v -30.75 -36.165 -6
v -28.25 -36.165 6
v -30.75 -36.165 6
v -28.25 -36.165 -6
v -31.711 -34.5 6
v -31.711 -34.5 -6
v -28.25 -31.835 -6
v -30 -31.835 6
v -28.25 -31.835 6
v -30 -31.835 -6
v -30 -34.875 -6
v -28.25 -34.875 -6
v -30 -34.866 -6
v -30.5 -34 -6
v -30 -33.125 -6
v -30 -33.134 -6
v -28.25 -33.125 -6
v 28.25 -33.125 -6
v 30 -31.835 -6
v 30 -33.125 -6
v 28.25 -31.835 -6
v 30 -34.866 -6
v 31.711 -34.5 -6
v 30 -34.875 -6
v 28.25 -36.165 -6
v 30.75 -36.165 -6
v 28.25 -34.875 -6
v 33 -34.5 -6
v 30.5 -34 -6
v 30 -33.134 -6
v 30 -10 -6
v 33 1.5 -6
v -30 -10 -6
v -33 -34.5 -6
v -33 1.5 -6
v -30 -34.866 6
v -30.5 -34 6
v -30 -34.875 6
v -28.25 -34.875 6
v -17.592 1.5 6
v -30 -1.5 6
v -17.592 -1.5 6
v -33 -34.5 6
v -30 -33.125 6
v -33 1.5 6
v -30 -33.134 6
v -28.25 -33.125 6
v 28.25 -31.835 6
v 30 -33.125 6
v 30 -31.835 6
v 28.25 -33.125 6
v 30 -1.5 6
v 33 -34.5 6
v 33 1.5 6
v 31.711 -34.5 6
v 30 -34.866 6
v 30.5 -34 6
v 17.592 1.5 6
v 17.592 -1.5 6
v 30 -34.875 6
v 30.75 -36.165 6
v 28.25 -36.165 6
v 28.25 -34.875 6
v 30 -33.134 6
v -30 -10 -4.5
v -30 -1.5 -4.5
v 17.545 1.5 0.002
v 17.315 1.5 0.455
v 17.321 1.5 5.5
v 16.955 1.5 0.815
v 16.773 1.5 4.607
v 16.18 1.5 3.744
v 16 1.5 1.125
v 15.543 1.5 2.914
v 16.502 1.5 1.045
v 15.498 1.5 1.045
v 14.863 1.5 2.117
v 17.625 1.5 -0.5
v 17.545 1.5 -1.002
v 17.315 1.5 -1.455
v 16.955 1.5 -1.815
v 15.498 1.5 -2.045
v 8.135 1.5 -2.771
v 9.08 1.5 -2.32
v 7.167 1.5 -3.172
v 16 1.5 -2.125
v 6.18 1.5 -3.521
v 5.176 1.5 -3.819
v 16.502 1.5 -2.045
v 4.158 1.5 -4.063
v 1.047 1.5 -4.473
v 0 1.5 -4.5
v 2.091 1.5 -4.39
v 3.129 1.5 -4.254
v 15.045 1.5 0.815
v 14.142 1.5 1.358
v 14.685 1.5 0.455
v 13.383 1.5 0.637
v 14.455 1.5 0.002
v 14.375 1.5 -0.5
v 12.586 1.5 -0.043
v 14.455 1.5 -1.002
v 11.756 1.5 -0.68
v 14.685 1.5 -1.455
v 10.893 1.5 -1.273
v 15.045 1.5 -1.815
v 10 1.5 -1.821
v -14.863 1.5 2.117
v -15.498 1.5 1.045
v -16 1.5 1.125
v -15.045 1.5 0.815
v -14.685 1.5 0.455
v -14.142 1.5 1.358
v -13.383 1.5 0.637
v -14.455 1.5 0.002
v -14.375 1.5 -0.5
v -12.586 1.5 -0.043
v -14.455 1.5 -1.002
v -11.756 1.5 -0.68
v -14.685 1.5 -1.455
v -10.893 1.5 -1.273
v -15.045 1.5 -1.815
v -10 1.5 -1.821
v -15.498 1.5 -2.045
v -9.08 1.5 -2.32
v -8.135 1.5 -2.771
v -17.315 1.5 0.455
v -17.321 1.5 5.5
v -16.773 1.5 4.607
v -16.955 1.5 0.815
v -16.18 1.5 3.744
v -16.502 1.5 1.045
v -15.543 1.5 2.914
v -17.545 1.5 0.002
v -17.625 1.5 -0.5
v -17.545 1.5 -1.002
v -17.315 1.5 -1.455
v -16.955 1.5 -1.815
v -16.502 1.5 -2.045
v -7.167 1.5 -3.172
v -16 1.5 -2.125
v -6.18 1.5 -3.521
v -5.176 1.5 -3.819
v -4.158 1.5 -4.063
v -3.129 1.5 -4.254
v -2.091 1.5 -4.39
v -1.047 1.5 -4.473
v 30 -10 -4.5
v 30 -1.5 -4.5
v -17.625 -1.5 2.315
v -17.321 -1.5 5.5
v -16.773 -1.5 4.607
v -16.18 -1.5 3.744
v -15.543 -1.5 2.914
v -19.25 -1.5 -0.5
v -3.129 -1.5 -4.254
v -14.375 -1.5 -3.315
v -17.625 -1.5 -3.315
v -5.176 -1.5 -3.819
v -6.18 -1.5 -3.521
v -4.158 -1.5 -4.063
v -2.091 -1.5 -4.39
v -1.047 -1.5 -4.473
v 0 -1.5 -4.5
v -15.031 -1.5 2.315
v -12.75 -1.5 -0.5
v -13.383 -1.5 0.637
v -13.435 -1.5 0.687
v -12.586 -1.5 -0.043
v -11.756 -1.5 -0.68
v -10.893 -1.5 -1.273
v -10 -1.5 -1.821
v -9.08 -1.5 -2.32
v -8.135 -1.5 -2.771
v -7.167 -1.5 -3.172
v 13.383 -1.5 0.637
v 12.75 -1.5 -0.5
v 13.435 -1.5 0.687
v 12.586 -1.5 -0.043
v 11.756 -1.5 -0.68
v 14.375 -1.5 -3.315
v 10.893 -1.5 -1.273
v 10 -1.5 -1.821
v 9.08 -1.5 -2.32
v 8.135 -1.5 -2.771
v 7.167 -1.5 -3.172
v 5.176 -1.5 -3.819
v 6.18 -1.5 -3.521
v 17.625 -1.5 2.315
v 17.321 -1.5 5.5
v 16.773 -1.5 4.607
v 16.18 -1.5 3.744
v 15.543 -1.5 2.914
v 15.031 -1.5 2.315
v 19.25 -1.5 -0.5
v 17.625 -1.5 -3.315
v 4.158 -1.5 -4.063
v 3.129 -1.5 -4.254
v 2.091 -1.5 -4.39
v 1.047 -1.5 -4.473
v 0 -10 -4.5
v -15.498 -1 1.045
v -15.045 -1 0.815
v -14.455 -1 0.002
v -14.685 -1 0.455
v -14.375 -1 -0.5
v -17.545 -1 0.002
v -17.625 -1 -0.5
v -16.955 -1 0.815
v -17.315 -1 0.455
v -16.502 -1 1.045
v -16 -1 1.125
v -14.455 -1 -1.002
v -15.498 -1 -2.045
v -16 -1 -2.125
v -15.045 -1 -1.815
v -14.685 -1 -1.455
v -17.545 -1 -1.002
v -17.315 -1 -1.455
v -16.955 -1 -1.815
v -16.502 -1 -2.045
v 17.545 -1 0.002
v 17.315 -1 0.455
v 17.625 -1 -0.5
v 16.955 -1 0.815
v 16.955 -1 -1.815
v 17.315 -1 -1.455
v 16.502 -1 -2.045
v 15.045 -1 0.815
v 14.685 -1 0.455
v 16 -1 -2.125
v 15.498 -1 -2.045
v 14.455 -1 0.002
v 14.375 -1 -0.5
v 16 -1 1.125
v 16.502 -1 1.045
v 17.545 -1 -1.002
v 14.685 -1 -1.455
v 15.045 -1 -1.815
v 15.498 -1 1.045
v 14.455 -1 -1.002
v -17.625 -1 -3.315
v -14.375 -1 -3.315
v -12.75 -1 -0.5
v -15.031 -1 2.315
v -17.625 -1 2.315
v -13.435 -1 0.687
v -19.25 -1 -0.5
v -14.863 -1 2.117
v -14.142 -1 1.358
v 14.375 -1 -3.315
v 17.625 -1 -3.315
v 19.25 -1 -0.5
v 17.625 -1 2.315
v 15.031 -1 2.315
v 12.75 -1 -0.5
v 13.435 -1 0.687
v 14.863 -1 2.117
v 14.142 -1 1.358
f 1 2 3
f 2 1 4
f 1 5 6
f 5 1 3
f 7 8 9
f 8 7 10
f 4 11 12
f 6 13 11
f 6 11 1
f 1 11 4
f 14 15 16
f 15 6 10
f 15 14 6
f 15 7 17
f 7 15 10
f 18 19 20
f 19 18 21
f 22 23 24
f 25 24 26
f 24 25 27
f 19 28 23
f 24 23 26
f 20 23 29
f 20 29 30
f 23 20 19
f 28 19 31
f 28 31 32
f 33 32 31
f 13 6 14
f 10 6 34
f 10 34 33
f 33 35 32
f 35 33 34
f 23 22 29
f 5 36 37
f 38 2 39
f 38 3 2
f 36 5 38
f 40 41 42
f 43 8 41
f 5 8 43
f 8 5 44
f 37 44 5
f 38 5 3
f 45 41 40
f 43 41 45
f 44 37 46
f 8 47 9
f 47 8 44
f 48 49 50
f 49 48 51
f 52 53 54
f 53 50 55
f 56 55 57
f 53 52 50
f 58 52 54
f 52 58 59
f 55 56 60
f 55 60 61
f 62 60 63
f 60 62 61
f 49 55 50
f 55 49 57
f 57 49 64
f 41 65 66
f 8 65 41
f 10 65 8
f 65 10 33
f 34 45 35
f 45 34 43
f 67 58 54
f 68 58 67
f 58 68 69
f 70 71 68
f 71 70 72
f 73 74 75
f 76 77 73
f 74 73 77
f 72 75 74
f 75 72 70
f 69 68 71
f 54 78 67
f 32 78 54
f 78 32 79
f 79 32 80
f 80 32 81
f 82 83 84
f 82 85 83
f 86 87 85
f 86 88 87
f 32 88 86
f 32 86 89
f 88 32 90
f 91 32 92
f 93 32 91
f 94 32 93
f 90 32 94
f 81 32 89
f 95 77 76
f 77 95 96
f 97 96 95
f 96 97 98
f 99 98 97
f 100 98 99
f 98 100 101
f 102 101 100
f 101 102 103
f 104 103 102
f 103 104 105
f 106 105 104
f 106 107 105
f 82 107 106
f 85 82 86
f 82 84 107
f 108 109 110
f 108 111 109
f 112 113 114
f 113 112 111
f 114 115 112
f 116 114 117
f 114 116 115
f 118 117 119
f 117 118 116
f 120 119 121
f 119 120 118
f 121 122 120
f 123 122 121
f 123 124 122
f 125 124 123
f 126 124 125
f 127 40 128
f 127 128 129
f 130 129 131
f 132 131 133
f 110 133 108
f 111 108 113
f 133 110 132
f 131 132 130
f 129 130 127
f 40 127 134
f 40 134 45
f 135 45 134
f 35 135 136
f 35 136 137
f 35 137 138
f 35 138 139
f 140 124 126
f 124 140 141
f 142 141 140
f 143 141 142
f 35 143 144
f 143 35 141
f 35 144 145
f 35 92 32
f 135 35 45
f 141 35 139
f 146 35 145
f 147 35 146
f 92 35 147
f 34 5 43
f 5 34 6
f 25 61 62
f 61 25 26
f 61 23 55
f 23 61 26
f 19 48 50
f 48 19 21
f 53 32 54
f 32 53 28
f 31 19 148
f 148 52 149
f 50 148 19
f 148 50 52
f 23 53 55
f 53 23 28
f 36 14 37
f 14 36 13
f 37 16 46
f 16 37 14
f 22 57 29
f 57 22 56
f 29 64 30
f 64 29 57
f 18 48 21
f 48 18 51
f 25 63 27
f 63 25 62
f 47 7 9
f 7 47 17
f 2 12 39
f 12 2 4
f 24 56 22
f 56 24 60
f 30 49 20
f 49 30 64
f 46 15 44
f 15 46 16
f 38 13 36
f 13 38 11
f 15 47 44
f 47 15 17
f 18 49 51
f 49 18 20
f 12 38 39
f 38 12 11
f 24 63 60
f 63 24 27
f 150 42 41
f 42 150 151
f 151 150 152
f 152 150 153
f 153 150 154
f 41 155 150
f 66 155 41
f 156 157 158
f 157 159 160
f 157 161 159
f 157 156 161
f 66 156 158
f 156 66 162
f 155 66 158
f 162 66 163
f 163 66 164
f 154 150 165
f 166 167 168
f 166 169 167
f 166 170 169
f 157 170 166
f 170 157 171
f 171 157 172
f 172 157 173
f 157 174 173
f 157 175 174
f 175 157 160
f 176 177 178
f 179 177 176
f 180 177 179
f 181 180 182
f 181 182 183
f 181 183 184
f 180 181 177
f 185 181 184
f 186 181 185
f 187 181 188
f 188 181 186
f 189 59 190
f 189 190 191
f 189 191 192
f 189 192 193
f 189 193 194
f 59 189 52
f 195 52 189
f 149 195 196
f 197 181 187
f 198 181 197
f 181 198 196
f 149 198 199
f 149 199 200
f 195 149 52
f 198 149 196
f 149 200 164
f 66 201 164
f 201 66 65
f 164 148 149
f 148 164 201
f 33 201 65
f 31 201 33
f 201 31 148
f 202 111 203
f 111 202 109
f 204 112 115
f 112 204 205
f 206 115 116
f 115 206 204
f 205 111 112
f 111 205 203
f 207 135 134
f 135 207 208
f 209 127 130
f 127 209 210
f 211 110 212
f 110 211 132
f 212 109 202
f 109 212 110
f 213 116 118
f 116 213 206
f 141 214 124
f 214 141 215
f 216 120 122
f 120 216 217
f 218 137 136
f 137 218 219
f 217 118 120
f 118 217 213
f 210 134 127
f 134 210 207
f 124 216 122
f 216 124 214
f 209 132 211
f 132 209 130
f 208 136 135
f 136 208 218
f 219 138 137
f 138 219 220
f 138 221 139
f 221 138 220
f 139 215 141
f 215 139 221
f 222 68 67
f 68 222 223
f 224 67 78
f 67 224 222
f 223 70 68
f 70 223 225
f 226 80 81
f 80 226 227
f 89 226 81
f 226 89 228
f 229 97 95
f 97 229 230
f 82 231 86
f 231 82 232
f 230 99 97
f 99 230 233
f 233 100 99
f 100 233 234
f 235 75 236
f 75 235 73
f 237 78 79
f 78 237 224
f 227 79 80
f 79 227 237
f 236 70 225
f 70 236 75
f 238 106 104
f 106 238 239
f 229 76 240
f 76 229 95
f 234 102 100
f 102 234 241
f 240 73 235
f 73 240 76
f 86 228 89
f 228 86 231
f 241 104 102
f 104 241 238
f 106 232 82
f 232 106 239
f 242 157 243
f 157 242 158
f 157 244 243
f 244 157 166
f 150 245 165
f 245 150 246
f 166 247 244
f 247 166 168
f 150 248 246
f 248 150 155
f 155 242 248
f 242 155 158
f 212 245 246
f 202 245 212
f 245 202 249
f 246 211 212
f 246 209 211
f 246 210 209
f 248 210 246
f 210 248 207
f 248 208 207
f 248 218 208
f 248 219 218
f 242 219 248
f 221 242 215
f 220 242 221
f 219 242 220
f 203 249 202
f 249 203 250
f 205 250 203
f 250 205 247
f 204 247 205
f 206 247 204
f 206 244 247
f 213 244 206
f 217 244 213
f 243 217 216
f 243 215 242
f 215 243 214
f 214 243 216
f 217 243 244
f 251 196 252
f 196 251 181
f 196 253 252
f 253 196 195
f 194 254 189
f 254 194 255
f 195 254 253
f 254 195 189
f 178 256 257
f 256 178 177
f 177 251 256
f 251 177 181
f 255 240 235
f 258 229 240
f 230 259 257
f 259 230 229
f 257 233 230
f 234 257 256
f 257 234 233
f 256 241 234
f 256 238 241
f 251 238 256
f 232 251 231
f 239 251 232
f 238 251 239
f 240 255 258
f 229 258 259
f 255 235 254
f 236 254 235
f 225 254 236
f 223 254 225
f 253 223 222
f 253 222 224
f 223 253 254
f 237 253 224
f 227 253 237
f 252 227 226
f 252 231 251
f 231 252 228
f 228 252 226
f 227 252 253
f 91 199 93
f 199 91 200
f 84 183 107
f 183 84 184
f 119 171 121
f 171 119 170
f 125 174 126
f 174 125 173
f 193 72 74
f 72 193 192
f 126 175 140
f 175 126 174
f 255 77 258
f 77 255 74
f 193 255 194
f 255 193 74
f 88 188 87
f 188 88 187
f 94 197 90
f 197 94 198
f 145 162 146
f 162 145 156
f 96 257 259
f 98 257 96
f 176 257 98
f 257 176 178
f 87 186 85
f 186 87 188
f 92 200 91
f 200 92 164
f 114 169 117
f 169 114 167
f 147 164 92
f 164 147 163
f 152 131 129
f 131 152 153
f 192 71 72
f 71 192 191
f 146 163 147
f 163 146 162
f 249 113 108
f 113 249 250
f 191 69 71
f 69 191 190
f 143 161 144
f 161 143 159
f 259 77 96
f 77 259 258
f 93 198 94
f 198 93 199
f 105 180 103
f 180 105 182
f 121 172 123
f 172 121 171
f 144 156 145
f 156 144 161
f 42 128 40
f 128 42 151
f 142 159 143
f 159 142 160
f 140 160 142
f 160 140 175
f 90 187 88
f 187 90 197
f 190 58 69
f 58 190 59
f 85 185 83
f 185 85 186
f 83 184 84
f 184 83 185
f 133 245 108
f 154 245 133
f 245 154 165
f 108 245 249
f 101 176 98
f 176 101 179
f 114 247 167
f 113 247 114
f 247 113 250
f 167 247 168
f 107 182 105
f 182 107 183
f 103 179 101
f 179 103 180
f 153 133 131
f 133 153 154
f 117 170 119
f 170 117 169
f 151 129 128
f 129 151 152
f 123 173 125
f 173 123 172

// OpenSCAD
// MOAB - MOther of All fan Brackets
// Design by Marius Gheorghescu, October 2013.
// Update log
// November 5th 2013: 
//  - fan cutout (and the screw holes) can be removed entirely now to produce spacers or PCB feet 
//  - hex nuts resize with screw size (need to vealidate in practice)
//  - cross-brace is configurable and can also be removed


// Typical values 40, 50, 60, 80. Set to 0 to not have a fan cutout.
fan_size = 40;

// Distance between two fan holes. Typical values: 32.00 for 40mm fan, 40.00 for 50mm fan, 50.00 for 60mm fan, 71.50 for 80mm fan, 105.00 for 120mm fan. Set to value larger than fan size to not have any screw holes
fan_hole_spacing = 32;

// Use 3.25mm for M3, 4.25mm for M4 and so on
screw_diameter = 3.25;

// width of the PCB. Common values: 60mm for RAMPS, 53.5mm for Arduino, 56mm for Raspberry Pi
pcb_width = 60.0;

// distance from bottom of the fan to PCB. Recommended value for RAMPS fuse clearance: 35mm
bracket_height = 36;

// how long the bracket needs to be, typically 10mm for mini brackets, or close to fan size for full brackets
bracket_length = 12;

// typically 2-4mm
bracket_thickness = 3.0;

// how tall is the cross brace that addds additional strength to the bracket, set to 0 to not have one
cross_bracket = 10;

/* [Hidden] */

// how much to go over the PCB
lip_size = 1.75;

// effective width of the bracket at the top
bracket_width = max(pcb_width, fan_size - 4);

module legs()
{

    difference() {
        union() {

            // left clip
            color([0,0,.5])
            translate([-pcb_width/2 + .5, -bracket_height + 2, 0])
                rotate([0, 0, 180]) 
                    cylinder(r=2.5, h=bracket_length, $fn=6, center=true);

            // left leg
            color([0,0,1])
            translate([-pcb_width/2 - bracket_thickness, -bracket_height + bracket_thickness/2, -bracket_length/2])
                cube([bracket_thickness, bracket_height, bracket_length]);


            // right clip
            color([0,0,.5])
            translate([pcb_width/2 - .5, -bracket_height + 2, 0])
                 rotate([0, 0, 180]) 
                     cylinder(r=2.5, h=bracket_length, $fn=6, center=true);

            // right leg
            color([0,0,1])
           translate([pcb_width/2 , -bracket_height + bracket_thickness/2, -bracket_length/2])
                cube([bracket_thickness, bracket_height, bracket_length]);

        }

        // left cutout
       translate([-pcb_width/2 + .5, -bracket_height + 2, 0])
            rotate([0, 0, 180]) 
                cylinder(r=1, h=bracket_length + 0.1, $fn=6, center=true);

        // right cutout
       translate([pcb_width/2 - .5, -bracket_height + 2, 0])
            cylinder(r=1, h=bracket_length + 0.1, $fn=6, center=true);

        // PCB lips clearance
        translate([0, -bracket_height + bracket_thickness + -.5,0])
            cube([pcb_width - 2*lip_size, 12, bracket_length + 0.1], center=true);

        // PCB
        translate([0, -bracket_height + 2, 0])
            cube([pcb_width, 1.75, bracket_length + 0.1], center=true);

    }

}

module fan_mask()
{
    // M3 screw
    translate([-fan_hole_spacing/2, -fan_hole_spacing/2, 0])
        cylinder(r=screw_diameter/2, h=bracket_height, $fn=20, center=true);
    translate([fan_hole_spacing/2, -fan_hole_spacing/2, 0])
        cylinder(r=screw_diameter/2, h=bracket_height, $fn=20, center=true);
    translate([-fan_hole_spacing/2, fan_hole_spacing/2, 0])
        cylinder(r=screw_diameter/2, h=bracket_height, $fn=20, center=true);
    translate([fan_hole_spacing/2, fan_hole_spacing/2, 0])
        cylinder(r=screw_diameter/2, h=bracket_height, $fn=20, center=true);

    // M3 nuts
    translate([-fan_hole_spacing/2, -fan_hole_spacing/2, 0])
        cylinder(r=screw_diameter, h=4, $fn=6, center=true);
    translate([fan_hole_spacing/2, -fan_hole_spacing/2, 0])
        cylinder(r=screw_diameter, h=4, $fn=6, center=true);
    translate([-fan_hole_spacing/2, fan_hole_spacing/2, 0])
        cylinder(r=screw_diameter, h=4, $fn=6, center=true);
    translate([fan_hole_spacing/2, fan_hole_spacing/2, 0])
        cylinder(r=screw_diameter, h=4, $fn=6, center=true);

    // fan blade clearance
    difference() {
        cylinder(r=fan_size/2, h=bracket_height, $fn=120, center=true);

        // $TODO - add support around the screws if they are too close to the blades
        // also need to add support if the bracket is not wide (tall) enough 
    }
}


module bracket()
{
    difference() {
        union() {

            // fan base
            translate([0, 0, 0])
                cube([bracket_width + 2*bracket_thickness, bracket_thickness, bracket_length], center=true);

            // extra strength 
            color([1,.5,0])
            translate([0, -cross_bracket/2, -bracket_length/2 + bracket_thickness/4])
                cube([pcb_width + 1, cross_bracket, bracket_thickness/2], center=true);

            legs();
        }


        translate([0, -bracket_thickness, -bracket_length/2 + fan_size/2 + bracket_thickness/2])
        rotate([90,0,0])
            fan_mask();

        }
}


module assembly() 
{
    color([1,0,0])
    translate([0, 0, -fan_size/2])
        bracket();

    color([1,0,0])
    //translate([0, 0, fan_size/2])
    rotate([0,180,0])
        bracket();

    color([0,.5,0])
    translate([0, -bracket_height + 2, 0])
        cube([pcb_width - 1, 1.75, fan_size*1.5], center=true);

}

//assembly();
bracket();
//fan_mask();
